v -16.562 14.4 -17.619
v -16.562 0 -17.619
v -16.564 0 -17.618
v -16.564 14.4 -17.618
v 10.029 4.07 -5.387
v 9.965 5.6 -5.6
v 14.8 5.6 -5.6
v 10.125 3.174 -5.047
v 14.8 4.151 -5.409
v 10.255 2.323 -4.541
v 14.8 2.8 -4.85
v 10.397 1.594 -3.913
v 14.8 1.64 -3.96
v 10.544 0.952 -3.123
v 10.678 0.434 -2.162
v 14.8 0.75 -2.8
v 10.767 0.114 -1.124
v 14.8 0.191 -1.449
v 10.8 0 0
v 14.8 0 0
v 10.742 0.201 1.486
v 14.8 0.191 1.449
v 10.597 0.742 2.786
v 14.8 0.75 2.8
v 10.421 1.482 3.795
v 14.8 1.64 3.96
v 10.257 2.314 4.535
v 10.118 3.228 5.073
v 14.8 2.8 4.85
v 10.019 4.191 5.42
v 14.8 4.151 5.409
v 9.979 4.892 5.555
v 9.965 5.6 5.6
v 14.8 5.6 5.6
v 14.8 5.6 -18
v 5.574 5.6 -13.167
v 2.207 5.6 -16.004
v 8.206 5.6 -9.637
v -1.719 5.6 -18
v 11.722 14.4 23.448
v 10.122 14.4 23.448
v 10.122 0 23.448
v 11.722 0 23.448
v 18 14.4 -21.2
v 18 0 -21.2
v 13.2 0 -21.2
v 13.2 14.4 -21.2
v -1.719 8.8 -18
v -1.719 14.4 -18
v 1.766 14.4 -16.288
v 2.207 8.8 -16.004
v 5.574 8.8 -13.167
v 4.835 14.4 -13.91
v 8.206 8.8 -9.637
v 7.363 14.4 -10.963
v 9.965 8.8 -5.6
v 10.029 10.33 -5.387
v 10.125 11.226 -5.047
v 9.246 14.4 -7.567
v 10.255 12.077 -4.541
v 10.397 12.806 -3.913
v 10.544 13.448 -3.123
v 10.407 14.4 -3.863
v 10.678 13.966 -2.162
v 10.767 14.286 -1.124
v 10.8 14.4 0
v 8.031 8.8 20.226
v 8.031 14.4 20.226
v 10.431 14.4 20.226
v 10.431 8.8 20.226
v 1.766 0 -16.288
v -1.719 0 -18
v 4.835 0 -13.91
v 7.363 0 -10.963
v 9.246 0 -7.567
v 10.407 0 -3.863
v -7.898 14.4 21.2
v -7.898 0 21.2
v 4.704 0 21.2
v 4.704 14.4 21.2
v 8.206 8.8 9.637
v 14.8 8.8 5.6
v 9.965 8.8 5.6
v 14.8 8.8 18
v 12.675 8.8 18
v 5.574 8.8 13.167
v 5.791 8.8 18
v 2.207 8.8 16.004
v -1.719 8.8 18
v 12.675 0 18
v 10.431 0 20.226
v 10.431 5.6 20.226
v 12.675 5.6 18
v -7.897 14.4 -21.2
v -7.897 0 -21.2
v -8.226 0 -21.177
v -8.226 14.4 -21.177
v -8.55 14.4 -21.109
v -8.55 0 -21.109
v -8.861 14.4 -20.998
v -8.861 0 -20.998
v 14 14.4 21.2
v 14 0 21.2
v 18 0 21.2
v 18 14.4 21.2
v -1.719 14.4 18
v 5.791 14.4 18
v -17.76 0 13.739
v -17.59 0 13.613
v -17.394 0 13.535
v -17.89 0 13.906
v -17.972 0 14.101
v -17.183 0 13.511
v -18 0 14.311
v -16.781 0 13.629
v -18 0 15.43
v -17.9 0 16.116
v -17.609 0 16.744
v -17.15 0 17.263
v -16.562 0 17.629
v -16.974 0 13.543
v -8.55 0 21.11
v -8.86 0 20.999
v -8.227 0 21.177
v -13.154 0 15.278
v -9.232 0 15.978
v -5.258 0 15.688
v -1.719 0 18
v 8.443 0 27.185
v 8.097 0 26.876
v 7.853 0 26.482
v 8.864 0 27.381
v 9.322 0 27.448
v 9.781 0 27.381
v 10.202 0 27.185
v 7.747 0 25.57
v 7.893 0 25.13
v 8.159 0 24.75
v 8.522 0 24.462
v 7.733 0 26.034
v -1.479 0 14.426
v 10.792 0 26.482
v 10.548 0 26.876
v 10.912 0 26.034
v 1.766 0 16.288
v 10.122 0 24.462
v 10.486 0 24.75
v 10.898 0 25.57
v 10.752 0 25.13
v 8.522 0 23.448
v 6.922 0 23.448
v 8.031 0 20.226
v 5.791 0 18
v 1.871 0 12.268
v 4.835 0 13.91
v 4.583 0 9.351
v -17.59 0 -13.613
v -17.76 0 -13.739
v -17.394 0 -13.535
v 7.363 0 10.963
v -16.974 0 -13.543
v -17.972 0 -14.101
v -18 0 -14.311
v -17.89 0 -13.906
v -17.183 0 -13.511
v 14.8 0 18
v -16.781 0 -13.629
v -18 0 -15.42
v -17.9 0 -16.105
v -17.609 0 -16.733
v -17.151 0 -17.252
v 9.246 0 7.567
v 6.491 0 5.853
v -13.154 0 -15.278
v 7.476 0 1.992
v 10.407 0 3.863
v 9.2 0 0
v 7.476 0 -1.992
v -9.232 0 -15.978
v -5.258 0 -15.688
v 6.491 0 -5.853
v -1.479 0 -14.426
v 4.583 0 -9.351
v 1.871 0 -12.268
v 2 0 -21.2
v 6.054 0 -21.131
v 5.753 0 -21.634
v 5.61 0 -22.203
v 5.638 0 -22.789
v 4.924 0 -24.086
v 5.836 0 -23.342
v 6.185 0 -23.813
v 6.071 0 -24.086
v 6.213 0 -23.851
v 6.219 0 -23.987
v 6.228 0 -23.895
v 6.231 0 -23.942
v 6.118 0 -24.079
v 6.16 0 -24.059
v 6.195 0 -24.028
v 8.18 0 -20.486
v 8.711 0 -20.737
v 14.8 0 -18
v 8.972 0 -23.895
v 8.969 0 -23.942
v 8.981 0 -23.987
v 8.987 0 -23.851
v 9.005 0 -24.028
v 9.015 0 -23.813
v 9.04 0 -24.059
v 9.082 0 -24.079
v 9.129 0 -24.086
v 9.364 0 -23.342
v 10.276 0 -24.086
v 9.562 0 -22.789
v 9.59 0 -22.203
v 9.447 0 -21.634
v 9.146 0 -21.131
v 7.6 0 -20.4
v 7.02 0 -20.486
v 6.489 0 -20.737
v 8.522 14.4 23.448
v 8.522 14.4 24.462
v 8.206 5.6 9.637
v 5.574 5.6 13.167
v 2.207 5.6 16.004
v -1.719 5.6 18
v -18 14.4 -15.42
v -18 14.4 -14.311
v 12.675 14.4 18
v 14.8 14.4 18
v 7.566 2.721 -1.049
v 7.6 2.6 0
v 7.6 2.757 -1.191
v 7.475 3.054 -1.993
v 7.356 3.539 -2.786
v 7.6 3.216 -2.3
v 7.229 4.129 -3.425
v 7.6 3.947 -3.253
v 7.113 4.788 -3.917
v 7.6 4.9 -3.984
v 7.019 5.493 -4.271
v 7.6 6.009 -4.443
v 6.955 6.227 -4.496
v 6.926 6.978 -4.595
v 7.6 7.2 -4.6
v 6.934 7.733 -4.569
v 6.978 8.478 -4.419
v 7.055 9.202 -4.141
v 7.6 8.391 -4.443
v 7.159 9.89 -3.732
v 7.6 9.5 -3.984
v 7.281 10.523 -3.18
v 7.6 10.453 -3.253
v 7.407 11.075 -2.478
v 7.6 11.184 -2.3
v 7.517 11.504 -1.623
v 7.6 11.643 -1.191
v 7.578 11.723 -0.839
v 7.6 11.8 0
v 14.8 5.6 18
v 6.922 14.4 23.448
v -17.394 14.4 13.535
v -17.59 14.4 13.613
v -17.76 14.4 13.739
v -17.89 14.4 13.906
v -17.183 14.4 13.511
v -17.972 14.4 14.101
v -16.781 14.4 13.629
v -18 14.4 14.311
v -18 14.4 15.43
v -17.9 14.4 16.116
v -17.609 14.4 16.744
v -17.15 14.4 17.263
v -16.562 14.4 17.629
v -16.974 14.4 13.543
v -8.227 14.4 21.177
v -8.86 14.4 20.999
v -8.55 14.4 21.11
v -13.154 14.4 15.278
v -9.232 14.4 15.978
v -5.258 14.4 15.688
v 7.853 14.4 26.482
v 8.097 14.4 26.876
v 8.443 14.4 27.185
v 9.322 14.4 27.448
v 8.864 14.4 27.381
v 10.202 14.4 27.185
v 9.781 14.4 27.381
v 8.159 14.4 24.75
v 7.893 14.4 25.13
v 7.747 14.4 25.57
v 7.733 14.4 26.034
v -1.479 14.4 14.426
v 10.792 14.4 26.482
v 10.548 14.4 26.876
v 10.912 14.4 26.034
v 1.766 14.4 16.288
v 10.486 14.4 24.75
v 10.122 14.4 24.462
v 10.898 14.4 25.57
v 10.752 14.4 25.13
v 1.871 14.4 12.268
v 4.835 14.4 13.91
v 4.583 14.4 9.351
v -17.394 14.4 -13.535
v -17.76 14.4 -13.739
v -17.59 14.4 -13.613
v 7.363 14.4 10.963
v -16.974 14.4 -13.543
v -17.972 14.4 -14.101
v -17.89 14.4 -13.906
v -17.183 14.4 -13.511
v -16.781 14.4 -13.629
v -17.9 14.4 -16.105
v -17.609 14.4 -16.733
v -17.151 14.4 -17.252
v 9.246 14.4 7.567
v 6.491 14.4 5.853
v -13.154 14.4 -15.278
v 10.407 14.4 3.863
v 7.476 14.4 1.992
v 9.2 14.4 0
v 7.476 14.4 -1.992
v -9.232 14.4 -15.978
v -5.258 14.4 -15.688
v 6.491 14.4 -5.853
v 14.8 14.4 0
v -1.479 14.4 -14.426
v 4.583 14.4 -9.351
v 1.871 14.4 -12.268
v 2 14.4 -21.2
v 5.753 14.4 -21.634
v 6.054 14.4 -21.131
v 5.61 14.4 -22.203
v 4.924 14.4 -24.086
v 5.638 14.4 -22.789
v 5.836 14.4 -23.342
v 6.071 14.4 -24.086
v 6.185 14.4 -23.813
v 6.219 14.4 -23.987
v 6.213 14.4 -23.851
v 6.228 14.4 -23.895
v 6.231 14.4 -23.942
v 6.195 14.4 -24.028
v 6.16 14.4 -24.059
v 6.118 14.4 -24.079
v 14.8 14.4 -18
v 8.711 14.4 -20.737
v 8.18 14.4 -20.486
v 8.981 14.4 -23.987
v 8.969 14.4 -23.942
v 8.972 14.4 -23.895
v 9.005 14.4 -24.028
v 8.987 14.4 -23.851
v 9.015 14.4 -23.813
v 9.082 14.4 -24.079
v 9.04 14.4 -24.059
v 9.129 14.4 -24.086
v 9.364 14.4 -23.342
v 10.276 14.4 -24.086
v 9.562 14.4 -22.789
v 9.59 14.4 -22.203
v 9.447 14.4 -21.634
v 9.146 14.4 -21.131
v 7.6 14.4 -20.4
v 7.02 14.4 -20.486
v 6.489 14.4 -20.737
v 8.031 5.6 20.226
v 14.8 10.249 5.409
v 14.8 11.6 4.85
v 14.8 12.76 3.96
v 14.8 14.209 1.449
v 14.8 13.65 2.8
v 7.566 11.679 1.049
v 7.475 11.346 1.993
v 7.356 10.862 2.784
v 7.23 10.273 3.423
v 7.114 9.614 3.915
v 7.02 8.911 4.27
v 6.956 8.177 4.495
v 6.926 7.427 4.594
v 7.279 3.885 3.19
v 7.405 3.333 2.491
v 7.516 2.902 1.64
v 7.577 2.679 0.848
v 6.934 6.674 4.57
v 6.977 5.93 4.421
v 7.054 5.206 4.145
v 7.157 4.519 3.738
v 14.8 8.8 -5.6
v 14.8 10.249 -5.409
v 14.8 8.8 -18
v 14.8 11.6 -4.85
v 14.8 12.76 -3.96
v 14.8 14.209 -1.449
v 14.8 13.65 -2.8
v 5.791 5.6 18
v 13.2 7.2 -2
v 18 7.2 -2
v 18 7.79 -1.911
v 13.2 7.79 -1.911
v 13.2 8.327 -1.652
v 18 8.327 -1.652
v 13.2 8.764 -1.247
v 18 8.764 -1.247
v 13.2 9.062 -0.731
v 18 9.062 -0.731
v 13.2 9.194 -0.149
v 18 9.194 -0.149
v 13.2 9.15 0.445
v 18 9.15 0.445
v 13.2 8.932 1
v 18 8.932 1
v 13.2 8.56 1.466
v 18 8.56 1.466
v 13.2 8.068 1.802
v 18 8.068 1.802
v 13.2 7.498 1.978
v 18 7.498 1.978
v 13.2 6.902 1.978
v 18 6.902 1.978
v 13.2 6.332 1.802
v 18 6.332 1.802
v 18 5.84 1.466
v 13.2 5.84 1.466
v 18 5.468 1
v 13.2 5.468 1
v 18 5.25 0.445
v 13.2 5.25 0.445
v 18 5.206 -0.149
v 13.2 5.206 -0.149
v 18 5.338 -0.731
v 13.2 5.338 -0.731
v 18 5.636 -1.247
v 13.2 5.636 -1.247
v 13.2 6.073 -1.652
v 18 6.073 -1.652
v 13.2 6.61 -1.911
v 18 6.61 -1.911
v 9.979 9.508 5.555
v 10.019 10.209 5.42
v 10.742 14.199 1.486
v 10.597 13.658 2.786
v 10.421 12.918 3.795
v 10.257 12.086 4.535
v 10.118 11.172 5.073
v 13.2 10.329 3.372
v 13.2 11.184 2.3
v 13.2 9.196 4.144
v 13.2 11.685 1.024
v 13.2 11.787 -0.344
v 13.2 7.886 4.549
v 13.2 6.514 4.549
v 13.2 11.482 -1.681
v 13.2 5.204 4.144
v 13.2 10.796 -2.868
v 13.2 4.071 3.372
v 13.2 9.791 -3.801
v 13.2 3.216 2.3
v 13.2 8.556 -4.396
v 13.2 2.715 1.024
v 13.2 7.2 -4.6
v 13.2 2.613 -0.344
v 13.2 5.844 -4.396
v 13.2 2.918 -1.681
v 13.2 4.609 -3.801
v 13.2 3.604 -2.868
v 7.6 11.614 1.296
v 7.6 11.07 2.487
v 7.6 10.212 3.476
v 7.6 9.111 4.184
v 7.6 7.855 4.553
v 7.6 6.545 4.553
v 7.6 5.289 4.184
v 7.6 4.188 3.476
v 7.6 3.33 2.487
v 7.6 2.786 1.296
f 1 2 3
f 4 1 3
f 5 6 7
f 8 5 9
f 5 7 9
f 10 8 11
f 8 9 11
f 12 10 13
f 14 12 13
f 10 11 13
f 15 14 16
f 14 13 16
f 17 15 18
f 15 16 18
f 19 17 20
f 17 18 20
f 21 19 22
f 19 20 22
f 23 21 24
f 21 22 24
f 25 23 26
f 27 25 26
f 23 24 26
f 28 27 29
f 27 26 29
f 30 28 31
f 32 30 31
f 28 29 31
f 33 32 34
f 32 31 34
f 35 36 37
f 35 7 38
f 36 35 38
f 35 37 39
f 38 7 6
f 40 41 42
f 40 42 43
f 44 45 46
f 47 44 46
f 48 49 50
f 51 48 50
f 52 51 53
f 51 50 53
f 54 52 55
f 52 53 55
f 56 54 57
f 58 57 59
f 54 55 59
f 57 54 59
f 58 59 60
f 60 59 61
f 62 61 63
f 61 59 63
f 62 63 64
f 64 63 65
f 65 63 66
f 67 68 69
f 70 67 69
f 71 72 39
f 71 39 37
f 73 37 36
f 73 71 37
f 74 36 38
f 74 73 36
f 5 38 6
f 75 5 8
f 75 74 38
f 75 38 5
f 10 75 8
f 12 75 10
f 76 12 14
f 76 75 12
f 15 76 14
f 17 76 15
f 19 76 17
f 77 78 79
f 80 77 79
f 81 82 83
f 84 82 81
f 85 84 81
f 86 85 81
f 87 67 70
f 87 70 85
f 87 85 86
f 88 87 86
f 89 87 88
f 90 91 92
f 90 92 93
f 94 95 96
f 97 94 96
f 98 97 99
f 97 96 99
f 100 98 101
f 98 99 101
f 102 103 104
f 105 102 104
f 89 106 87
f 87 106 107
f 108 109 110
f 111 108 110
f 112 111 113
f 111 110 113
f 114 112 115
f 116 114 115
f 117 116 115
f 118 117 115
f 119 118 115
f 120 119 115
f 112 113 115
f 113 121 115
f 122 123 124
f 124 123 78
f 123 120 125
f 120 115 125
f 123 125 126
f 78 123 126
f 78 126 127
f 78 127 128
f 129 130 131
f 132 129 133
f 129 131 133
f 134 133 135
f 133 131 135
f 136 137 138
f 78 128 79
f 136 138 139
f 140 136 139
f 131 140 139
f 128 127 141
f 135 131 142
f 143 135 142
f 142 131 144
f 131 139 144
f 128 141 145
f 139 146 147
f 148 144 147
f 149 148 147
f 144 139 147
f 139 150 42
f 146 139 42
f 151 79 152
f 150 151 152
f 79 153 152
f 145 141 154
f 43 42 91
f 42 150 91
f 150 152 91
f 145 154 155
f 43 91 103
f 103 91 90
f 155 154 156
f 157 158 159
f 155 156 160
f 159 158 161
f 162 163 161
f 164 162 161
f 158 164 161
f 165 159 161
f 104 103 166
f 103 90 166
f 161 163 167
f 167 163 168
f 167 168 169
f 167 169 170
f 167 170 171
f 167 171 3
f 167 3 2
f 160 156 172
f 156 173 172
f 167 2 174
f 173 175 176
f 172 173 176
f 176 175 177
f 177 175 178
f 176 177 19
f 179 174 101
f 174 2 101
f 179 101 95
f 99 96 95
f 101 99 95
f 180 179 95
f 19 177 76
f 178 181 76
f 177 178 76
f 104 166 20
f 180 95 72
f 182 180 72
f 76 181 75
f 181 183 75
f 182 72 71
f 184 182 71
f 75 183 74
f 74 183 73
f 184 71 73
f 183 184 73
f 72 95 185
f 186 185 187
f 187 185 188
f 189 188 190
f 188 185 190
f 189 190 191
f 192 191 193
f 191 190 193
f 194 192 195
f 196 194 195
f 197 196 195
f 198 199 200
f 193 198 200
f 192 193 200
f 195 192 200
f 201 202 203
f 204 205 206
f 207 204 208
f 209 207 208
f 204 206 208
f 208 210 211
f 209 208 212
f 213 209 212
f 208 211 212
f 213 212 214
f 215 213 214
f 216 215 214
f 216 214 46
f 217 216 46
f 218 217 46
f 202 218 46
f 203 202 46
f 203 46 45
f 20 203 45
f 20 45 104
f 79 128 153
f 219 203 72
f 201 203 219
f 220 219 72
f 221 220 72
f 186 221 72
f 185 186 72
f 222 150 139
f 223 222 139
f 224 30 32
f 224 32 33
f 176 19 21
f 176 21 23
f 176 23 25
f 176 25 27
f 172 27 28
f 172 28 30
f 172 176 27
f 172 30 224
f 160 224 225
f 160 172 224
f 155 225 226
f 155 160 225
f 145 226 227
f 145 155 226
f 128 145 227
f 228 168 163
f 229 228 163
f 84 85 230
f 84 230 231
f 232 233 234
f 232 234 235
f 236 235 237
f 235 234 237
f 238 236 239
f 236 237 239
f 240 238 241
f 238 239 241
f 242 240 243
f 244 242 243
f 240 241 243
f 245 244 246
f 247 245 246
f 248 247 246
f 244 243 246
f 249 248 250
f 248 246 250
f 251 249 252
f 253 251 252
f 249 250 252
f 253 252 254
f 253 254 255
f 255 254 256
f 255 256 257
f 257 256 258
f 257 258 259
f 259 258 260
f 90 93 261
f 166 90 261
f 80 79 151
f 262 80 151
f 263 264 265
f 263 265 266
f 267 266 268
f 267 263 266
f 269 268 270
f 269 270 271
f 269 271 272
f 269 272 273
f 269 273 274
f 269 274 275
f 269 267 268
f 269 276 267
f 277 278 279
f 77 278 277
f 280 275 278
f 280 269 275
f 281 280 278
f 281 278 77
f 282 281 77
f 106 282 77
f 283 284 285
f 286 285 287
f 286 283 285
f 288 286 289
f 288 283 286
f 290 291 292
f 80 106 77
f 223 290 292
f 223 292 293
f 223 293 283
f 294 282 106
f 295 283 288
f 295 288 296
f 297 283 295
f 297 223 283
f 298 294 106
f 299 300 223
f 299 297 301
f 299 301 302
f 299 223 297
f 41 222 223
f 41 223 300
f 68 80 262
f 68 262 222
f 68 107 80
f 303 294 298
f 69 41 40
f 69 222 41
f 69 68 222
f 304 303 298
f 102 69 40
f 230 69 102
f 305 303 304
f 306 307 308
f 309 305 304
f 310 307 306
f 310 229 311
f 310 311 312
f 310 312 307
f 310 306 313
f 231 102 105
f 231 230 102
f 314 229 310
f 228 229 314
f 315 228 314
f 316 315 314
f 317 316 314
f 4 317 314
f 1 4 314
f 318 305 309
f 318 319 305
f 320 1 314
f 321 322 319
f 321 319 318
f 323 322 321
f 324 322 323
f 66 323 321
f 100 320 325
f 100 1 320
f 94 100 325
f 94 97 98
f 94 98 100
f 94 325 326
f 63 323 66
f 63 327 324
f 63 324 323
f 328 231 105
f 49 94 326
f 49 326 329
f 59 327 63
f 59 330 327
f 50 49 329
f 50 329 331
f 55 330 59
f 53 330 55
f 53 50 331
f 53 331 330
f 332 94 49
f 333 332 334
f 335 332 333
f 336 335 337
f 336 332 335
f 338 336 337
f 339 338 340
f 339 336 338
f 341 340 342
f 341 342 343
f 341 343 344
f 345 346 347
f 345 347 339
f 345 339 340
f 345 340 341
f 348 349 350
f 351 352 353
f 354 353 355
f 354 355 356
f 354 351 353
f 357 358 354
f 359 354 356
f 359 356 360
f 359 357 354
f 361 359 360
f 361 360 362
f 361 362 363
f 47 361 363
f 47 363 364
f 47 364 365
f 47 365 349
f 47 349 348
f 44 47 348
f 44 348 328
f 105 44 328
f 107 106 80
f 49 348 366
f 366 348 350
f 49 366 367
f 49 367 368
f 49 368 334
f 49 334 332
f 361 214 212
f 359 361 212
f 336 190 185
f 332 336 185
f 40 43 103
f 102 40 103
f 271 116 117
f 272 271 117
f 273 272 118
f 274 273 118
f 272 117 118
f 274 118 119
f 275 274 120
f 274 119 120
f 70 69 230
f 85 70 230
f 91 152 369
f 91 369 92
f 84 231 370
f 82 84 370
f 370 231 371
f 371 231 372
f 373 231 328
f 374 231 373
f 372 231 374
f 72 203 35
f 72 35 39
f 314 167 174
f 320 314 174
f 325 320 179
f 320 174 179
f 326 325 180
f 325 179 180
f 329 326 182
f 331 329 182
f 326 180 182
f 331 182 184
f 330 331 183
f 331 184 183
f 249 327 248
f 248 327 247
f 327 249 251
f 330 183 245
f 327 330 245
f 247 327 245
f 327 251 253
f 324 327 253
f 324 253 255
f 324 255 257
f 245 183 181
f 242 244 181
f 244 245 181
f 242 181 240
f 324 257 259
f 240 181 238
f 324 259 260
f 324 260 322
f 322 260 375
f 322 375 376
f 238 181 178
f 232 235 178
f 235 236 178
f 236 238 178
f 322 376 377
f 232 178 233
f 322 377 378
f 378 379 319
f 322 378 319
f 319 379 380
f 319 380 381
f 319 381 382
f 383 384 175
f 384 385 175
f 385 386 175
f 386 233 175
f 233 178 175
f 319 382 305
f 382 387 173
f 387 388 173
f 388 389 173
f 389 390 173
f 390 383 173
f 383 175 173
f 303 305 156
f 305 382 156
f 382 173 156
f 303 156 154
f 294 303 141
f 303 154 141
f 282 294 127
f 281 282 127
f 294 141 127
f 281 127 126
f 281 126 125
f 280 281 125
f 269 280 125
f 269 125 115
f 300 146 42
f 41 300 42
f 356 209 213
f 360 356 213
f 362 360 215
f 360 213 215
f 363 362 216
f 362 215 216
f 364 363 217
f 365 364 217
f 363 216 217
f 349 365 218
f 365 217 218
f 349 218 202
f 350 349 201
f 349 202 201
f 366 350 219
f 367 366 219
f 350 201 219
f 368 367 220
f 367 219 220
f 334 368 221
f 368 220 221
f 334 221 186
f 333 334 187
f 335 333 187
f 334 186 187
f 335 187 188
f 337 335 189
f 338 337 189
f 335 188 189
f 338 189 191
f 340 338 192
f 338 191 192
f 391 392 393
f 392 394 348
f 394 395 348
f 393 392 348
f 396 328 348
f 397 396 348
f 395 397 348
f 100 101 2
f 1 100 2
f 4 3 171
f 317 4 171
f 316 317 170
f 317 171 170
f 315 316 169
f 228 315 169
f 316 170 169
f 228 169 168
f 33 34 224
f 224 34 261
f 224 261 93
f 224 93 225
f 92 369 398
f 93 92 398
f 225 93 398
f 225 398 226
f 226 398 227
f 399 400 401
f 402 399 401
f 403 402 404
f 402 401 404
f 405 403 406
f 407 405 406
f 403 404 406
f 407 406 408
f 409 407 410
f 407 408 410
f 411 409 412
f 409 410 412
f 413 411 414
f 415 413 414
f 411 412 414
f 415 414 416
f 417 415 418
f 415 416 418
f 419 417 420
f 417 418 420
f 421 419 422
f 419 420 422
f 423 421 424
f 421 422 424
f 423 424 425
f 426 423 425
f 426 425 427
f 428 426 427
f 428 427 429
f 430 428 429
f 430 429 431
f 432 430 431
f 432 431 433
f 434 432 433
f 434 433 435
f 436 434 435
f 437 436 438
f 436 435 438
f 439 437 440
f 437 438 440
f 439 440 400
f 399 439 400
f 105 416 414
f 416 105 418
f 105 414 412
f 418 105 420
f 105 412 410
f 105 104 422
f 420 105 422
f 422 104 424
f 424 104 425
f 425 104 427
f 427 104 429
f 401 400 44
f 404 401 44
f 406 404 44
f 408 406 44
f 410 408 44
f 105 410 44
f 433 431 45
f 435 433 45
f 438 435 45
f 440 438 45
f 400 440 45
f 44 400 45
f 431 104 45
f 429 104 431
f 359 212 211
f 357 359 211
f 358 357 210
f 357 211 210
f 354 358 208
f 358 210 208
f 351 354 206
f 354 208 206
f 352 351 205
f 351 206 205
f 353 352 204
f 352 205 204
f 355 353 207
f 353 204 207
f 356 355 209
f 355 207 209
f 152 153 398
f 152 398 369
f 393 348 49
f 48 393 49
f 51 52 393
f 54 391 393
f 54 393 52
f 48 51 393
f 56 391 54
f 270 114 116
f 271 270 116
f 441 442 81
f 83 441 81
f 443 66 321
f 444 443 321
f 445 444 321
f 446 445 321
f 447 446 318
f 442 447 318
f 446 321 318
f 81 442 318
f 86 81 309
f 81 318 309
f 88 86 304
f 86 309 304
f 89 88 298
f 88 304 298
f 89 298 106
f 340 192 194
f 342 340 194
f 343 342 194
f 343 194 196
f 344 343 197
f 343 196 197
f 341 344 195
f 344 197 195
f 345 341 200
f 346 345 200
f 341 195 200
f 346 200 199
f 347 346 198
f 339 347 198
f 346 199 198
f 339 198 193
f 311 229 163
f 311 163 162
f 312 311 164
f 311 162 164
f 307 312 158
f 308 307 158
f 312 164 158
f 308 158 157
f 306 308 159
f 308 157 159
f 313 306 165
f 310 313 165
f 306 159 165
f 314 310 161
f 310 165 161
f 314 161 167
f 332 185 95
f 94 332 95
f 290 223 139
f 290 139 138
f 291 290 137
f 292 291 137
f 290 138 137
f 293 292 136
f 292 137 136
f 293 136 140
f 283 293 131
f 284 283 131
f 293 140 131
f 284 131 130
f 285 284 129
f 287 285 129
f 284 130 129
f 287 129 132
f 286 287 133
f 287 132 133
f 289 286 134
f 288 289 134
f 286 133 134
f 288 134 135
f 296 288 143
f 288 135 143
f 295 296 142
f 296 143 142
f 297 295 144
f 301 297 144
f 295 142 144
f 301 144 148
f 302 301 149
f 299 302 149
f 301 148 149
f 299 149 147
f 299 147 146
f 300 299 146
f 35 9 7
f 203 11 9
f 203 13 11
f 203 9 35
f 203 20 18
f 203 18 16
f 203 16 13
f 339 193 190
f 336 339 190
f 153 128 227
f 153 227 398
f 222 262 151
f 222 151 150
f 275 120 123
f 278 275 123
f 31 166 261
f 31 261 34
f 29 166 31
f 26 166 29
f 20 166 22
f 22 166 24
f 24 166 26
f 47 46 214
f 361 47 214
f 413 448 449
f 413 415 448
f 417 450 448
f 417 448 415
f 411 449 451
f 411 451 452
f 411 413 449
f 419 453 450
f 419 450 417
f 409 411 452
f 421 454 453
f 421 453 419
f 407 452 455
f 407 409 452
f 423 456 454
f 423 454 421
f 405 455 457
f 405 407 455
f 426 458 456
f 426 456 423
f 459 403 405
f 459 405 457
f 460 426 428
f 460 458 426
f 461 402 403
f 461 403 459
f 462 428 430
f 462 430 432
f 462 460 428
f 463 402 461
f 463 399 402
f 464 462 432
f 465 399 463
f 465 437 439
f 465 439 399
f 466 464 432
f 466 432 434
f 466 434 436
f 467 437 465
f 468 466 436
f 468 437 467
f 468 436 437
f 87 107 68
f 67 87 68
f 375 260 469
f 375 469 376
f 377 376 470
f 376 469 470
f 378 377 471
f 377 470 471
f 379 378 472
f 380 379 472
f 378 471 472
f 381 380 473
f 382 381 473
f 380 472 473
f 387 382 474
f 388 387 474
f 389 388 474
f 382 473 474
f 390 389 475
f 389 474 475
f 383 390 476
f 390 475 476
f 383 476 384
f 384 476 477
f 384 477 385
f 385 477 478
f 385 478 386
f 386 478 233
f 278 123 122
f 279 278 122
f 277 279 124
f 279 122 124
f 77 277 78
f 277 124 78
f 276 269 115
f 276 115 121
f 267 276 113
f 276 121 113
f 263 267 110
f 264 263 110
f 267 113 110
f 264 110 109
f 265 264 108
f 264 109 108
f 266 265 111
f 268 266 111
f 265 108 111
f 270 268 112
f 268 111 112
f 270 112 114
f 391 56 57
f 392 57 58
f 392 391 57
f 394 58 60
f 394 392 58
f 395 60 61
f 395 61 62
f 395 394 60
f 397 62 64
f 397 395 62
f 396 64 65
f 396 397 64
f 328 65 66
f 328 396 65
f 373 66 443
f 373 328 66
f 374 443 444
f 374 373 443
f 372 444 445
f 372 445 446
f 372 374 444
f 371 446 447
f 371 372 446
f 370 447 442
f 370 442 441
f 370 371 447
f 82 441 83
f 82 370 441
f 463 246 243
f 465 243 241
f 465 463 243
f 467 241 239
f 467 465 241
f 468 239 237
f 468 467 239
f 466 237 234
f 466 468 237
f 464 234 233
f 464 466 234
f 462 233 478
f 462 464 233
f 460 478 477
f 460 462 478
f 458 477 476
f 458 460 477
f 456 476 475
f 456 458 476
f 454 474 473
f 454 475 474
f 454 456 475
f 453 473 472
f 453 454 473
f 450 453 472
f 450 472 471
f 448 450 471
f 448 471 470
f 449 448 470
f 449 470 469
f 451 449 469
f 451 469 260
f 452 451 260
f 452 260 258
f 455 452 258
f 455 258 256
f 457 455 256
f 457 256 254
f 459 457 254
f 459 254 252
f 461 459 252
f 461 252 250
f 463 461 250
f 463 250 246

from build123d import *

# Parameters (mm, degrees)
BOSS_EXTRUDE1_DEPTH = 18
CUT_EXTRUDE1_DEPTH  = 7
BOSS_EXTRUDE2_DEPTH = 7
SKETCH4_R           = 2.5
CUT_EXTRUDE2_DEPTH  = 6
SKETCH5_R           = 5.75
CUT_EXTRUDE3_DEPTH  = 7
CUT_EXTRUDE4_START  = -7
SKETCH6_R           = 5.75
CUT_EXTRUDE4_DEPTH  = 7
SCALE1_SCALE        = 0.75
SCALE2_SCALE        = 1.066666667


with BuildPart() as part:
    # Sketch1 → Boss-Extrude1 (new body)
    with BuildSketch(Plane(origin=(0, 0, 0), x_dir=(1, 0, 0), z_dir=(0, 1, 0))):
        with BuildLine():
            Line((10.653013329, -29.309744988), (10.653013329, -30.57769418))
            ThreePointArc((10.653013329, -30.57769418), (11.653013329, -34.309744988), (12.653013329, -30.57769418))
            Line((12.653013329, -30.57769418), (12.653013329, -29.309744988))
            Line((12.653013329, -29.309744988), (14.653013329, -29.309744988))
            Line((14.653013329, -29.309744988), (17.5, -26.5))
            Line((17.5, -26.5), (22.5, -26.5))
            Line((22.5, -26.5), (22.5, 26.5))
            Line((22.5, 26.5), (16.5, 26.5))
            Line((16.5, 26.5), (12.844502727, 30.107679392))
            Line((12.844502727, 30.107679392), (11.410696035, 30.107679392))
            ThreePointArc((11.410696035, 30.107679392), (11.225950376, 29.984289062), (11.269162996, 29.766369807))
            ThreePointArc((11.269162996, 29.766369807), (9.5, 25.5), (7.730837004, 29.766369807))
            ThreePointArc((7.730837004, 29.766369807), (7.774049624, 29.984289062), (7.589303965, 30.107679392))
            Line((7.589303965, 30.107679392), (6.155497273, 30.107679392))
            Line((6.155497273, 30.107679392), (2.5, 26.5))
            Line((2.5, 26.5), (-9.870833143, 26.5))
            ThreePointArc((-9.870833143, 26.5), (-10.486603861, 26.436124388), (-11.076152757, 26.247217616))
            Line((-11.076152757, 26.247217616), (-20.702456422, 22.023754373))
            Line((-20.702456422, 22.023754373), (-20.705319614, 22.022498171))
            ThreePointArc((-20.705319614, 22.022498171), (-22.011569115, 20.916018371), (-22.5, 19.275280555))
            Line((-22.5, 19.275280555), (-22.5, 17.88854382))
            ThreePointArc((-22.5, 17.88854382), (-21.987950036, 17.015672259), (-20.976190476, 17.0367084))
            ThreePointArc((-20.976190476, 17.0367084), (9.5, 0), (-20.976190476, -17.0367084))
            ThreePointArc((-20.976190476, -17.0367084), (-21.987950036, -17.015672259), (-22.5, -17.88854382))
            Line((-22.5, -17.88854382), (-22.5, -19.287953276))
            ThreePointArc((-22.5, -19.287953276), (-22.010713993, -20.929999331), (-20.702456502, -22.03642528))
            Line((-20.702456502, -22.03642528), (-11.074921132, -26.248472005))
            ThreePointArc((-11.074921132, -26.248472005), (-10.486705619, -26.43644479), (-9.87246463, -26.5))
            Line((-9.87246463, -26.5), (5.880022863, -26.5))
            Line((5.880022863, -26.5), (8.653013329, -29.309744988))
            Line((8.653013329, -29.309744988), (10.653013329, -29.309744988))
        make_face()
    extrude(amount=BOSS_EXTRUDE1_DEPTH)

    # Sketch2 → Cut-Extrude1 (cut)
    with BuildSketch(Plane.XZ):
        with BuildLine():
            Line((18.5, 22.5), (18.5, -22.5))
            Line((18.5, -22.5), (-2.148353456, -22.5))
            ThreePointArc((-2.148353456, -22.5), (13.5, 0), (-2.148353456, 22.5))
            Line((-2.148353456, 22.5), (7.238559187, 22.5))
            Line((7.238559187, 22.5), (10.039345887, 25.282038261))
            Line((10.039345887, 25.282038261), (13.039345883, 25.282178795))
            Line((13.039345883, 25.282178795), (15.843268341, 22.5))
            Line((15.843268341, 22.5), (18.5, 22.5))
        make_face()
    cut_extrude1 = extrude(amount=-CUT_EXTRUDE1_DEPTH, mode=Mode.SUBTRACT)

    # Mirror1: Cut-Extrude1 across plane
    add(cut_extrude1.mirror(Plane(origin=(0, 9, 0), x_dir=(0, 0, 1), z_dir=(0, -1, 0))), mode=Mode.SUBTRACT)

    # Sketch3 → Boss-Extrude2 (add)
    with BuildSketch(Plane.ZY.offset(-18.5)):
        with BuildLine():
            Line((7, 7), (-7, 7))
            ThreePointArc((-7, 7), (0, 0), (7, 7))
        make_face()
    boss_extrude2 = extrude(amount=BOSS_EXTRUDE2_DEPTH)

    # Mirror2: Boss-Extrude2 across plane
    add(boss_extrude2.mirror(Plane(origin=(0, 9, 0), x_dir=(0, 0, 1), z_dir=(0, -1, 0))))

    # Sketch4 → Cut-Extrude2 (cut)
    with BuildSketch(Plane(origin=(22.5, 0, 0), x_dir=(0, 0, -1), z_dir=(1, 0, 0))):
        with Locations((0, 9)):
            Circle(SKETCH4_R)
    extrude(amount=-CUT_EXTRUDE2_DEPTH, mode=Mode.SUBTRACT)

    # Sketch5 → Cut-Extrude3 (cut)
    with BuildSketch(Plane(origin=(9.5, 0, 0), x_dir=(0, 0, -1), z_dir=(1, 0, 0))):
        with Locations((0, 9)):
            Circle(SKETCH5_R)
    extrude(amount=-CUT_EXTRUDE3_DEPTH, mode=Mode.SUBTRACT)

    # Sketch6 → Cut-Extrude4 (cut)
    with BuildSketch(Plane.ZY.offset(-9.5).offset(CUT_EXTRUDE4_START)):
        with Locations(Location((0, 9, 0), (0, 0, 180))):
            Circle(SKETCH6_R)
    extrude(amount=CUT_EXTRUDE4_DEPTH, mode=Mode.SUBTRACT)


with BuildPart() as part_1:
    # Scale1: scaled about (0, 0, 0)
    add(part.part.scale(SCALE1_SCALE))


with BuildPart() as part_2:
    # Scale2: scaled about (0, 0, 0)
    add(part_1.part.scale(SCALE2_SCALE))


solid = part_2.part
